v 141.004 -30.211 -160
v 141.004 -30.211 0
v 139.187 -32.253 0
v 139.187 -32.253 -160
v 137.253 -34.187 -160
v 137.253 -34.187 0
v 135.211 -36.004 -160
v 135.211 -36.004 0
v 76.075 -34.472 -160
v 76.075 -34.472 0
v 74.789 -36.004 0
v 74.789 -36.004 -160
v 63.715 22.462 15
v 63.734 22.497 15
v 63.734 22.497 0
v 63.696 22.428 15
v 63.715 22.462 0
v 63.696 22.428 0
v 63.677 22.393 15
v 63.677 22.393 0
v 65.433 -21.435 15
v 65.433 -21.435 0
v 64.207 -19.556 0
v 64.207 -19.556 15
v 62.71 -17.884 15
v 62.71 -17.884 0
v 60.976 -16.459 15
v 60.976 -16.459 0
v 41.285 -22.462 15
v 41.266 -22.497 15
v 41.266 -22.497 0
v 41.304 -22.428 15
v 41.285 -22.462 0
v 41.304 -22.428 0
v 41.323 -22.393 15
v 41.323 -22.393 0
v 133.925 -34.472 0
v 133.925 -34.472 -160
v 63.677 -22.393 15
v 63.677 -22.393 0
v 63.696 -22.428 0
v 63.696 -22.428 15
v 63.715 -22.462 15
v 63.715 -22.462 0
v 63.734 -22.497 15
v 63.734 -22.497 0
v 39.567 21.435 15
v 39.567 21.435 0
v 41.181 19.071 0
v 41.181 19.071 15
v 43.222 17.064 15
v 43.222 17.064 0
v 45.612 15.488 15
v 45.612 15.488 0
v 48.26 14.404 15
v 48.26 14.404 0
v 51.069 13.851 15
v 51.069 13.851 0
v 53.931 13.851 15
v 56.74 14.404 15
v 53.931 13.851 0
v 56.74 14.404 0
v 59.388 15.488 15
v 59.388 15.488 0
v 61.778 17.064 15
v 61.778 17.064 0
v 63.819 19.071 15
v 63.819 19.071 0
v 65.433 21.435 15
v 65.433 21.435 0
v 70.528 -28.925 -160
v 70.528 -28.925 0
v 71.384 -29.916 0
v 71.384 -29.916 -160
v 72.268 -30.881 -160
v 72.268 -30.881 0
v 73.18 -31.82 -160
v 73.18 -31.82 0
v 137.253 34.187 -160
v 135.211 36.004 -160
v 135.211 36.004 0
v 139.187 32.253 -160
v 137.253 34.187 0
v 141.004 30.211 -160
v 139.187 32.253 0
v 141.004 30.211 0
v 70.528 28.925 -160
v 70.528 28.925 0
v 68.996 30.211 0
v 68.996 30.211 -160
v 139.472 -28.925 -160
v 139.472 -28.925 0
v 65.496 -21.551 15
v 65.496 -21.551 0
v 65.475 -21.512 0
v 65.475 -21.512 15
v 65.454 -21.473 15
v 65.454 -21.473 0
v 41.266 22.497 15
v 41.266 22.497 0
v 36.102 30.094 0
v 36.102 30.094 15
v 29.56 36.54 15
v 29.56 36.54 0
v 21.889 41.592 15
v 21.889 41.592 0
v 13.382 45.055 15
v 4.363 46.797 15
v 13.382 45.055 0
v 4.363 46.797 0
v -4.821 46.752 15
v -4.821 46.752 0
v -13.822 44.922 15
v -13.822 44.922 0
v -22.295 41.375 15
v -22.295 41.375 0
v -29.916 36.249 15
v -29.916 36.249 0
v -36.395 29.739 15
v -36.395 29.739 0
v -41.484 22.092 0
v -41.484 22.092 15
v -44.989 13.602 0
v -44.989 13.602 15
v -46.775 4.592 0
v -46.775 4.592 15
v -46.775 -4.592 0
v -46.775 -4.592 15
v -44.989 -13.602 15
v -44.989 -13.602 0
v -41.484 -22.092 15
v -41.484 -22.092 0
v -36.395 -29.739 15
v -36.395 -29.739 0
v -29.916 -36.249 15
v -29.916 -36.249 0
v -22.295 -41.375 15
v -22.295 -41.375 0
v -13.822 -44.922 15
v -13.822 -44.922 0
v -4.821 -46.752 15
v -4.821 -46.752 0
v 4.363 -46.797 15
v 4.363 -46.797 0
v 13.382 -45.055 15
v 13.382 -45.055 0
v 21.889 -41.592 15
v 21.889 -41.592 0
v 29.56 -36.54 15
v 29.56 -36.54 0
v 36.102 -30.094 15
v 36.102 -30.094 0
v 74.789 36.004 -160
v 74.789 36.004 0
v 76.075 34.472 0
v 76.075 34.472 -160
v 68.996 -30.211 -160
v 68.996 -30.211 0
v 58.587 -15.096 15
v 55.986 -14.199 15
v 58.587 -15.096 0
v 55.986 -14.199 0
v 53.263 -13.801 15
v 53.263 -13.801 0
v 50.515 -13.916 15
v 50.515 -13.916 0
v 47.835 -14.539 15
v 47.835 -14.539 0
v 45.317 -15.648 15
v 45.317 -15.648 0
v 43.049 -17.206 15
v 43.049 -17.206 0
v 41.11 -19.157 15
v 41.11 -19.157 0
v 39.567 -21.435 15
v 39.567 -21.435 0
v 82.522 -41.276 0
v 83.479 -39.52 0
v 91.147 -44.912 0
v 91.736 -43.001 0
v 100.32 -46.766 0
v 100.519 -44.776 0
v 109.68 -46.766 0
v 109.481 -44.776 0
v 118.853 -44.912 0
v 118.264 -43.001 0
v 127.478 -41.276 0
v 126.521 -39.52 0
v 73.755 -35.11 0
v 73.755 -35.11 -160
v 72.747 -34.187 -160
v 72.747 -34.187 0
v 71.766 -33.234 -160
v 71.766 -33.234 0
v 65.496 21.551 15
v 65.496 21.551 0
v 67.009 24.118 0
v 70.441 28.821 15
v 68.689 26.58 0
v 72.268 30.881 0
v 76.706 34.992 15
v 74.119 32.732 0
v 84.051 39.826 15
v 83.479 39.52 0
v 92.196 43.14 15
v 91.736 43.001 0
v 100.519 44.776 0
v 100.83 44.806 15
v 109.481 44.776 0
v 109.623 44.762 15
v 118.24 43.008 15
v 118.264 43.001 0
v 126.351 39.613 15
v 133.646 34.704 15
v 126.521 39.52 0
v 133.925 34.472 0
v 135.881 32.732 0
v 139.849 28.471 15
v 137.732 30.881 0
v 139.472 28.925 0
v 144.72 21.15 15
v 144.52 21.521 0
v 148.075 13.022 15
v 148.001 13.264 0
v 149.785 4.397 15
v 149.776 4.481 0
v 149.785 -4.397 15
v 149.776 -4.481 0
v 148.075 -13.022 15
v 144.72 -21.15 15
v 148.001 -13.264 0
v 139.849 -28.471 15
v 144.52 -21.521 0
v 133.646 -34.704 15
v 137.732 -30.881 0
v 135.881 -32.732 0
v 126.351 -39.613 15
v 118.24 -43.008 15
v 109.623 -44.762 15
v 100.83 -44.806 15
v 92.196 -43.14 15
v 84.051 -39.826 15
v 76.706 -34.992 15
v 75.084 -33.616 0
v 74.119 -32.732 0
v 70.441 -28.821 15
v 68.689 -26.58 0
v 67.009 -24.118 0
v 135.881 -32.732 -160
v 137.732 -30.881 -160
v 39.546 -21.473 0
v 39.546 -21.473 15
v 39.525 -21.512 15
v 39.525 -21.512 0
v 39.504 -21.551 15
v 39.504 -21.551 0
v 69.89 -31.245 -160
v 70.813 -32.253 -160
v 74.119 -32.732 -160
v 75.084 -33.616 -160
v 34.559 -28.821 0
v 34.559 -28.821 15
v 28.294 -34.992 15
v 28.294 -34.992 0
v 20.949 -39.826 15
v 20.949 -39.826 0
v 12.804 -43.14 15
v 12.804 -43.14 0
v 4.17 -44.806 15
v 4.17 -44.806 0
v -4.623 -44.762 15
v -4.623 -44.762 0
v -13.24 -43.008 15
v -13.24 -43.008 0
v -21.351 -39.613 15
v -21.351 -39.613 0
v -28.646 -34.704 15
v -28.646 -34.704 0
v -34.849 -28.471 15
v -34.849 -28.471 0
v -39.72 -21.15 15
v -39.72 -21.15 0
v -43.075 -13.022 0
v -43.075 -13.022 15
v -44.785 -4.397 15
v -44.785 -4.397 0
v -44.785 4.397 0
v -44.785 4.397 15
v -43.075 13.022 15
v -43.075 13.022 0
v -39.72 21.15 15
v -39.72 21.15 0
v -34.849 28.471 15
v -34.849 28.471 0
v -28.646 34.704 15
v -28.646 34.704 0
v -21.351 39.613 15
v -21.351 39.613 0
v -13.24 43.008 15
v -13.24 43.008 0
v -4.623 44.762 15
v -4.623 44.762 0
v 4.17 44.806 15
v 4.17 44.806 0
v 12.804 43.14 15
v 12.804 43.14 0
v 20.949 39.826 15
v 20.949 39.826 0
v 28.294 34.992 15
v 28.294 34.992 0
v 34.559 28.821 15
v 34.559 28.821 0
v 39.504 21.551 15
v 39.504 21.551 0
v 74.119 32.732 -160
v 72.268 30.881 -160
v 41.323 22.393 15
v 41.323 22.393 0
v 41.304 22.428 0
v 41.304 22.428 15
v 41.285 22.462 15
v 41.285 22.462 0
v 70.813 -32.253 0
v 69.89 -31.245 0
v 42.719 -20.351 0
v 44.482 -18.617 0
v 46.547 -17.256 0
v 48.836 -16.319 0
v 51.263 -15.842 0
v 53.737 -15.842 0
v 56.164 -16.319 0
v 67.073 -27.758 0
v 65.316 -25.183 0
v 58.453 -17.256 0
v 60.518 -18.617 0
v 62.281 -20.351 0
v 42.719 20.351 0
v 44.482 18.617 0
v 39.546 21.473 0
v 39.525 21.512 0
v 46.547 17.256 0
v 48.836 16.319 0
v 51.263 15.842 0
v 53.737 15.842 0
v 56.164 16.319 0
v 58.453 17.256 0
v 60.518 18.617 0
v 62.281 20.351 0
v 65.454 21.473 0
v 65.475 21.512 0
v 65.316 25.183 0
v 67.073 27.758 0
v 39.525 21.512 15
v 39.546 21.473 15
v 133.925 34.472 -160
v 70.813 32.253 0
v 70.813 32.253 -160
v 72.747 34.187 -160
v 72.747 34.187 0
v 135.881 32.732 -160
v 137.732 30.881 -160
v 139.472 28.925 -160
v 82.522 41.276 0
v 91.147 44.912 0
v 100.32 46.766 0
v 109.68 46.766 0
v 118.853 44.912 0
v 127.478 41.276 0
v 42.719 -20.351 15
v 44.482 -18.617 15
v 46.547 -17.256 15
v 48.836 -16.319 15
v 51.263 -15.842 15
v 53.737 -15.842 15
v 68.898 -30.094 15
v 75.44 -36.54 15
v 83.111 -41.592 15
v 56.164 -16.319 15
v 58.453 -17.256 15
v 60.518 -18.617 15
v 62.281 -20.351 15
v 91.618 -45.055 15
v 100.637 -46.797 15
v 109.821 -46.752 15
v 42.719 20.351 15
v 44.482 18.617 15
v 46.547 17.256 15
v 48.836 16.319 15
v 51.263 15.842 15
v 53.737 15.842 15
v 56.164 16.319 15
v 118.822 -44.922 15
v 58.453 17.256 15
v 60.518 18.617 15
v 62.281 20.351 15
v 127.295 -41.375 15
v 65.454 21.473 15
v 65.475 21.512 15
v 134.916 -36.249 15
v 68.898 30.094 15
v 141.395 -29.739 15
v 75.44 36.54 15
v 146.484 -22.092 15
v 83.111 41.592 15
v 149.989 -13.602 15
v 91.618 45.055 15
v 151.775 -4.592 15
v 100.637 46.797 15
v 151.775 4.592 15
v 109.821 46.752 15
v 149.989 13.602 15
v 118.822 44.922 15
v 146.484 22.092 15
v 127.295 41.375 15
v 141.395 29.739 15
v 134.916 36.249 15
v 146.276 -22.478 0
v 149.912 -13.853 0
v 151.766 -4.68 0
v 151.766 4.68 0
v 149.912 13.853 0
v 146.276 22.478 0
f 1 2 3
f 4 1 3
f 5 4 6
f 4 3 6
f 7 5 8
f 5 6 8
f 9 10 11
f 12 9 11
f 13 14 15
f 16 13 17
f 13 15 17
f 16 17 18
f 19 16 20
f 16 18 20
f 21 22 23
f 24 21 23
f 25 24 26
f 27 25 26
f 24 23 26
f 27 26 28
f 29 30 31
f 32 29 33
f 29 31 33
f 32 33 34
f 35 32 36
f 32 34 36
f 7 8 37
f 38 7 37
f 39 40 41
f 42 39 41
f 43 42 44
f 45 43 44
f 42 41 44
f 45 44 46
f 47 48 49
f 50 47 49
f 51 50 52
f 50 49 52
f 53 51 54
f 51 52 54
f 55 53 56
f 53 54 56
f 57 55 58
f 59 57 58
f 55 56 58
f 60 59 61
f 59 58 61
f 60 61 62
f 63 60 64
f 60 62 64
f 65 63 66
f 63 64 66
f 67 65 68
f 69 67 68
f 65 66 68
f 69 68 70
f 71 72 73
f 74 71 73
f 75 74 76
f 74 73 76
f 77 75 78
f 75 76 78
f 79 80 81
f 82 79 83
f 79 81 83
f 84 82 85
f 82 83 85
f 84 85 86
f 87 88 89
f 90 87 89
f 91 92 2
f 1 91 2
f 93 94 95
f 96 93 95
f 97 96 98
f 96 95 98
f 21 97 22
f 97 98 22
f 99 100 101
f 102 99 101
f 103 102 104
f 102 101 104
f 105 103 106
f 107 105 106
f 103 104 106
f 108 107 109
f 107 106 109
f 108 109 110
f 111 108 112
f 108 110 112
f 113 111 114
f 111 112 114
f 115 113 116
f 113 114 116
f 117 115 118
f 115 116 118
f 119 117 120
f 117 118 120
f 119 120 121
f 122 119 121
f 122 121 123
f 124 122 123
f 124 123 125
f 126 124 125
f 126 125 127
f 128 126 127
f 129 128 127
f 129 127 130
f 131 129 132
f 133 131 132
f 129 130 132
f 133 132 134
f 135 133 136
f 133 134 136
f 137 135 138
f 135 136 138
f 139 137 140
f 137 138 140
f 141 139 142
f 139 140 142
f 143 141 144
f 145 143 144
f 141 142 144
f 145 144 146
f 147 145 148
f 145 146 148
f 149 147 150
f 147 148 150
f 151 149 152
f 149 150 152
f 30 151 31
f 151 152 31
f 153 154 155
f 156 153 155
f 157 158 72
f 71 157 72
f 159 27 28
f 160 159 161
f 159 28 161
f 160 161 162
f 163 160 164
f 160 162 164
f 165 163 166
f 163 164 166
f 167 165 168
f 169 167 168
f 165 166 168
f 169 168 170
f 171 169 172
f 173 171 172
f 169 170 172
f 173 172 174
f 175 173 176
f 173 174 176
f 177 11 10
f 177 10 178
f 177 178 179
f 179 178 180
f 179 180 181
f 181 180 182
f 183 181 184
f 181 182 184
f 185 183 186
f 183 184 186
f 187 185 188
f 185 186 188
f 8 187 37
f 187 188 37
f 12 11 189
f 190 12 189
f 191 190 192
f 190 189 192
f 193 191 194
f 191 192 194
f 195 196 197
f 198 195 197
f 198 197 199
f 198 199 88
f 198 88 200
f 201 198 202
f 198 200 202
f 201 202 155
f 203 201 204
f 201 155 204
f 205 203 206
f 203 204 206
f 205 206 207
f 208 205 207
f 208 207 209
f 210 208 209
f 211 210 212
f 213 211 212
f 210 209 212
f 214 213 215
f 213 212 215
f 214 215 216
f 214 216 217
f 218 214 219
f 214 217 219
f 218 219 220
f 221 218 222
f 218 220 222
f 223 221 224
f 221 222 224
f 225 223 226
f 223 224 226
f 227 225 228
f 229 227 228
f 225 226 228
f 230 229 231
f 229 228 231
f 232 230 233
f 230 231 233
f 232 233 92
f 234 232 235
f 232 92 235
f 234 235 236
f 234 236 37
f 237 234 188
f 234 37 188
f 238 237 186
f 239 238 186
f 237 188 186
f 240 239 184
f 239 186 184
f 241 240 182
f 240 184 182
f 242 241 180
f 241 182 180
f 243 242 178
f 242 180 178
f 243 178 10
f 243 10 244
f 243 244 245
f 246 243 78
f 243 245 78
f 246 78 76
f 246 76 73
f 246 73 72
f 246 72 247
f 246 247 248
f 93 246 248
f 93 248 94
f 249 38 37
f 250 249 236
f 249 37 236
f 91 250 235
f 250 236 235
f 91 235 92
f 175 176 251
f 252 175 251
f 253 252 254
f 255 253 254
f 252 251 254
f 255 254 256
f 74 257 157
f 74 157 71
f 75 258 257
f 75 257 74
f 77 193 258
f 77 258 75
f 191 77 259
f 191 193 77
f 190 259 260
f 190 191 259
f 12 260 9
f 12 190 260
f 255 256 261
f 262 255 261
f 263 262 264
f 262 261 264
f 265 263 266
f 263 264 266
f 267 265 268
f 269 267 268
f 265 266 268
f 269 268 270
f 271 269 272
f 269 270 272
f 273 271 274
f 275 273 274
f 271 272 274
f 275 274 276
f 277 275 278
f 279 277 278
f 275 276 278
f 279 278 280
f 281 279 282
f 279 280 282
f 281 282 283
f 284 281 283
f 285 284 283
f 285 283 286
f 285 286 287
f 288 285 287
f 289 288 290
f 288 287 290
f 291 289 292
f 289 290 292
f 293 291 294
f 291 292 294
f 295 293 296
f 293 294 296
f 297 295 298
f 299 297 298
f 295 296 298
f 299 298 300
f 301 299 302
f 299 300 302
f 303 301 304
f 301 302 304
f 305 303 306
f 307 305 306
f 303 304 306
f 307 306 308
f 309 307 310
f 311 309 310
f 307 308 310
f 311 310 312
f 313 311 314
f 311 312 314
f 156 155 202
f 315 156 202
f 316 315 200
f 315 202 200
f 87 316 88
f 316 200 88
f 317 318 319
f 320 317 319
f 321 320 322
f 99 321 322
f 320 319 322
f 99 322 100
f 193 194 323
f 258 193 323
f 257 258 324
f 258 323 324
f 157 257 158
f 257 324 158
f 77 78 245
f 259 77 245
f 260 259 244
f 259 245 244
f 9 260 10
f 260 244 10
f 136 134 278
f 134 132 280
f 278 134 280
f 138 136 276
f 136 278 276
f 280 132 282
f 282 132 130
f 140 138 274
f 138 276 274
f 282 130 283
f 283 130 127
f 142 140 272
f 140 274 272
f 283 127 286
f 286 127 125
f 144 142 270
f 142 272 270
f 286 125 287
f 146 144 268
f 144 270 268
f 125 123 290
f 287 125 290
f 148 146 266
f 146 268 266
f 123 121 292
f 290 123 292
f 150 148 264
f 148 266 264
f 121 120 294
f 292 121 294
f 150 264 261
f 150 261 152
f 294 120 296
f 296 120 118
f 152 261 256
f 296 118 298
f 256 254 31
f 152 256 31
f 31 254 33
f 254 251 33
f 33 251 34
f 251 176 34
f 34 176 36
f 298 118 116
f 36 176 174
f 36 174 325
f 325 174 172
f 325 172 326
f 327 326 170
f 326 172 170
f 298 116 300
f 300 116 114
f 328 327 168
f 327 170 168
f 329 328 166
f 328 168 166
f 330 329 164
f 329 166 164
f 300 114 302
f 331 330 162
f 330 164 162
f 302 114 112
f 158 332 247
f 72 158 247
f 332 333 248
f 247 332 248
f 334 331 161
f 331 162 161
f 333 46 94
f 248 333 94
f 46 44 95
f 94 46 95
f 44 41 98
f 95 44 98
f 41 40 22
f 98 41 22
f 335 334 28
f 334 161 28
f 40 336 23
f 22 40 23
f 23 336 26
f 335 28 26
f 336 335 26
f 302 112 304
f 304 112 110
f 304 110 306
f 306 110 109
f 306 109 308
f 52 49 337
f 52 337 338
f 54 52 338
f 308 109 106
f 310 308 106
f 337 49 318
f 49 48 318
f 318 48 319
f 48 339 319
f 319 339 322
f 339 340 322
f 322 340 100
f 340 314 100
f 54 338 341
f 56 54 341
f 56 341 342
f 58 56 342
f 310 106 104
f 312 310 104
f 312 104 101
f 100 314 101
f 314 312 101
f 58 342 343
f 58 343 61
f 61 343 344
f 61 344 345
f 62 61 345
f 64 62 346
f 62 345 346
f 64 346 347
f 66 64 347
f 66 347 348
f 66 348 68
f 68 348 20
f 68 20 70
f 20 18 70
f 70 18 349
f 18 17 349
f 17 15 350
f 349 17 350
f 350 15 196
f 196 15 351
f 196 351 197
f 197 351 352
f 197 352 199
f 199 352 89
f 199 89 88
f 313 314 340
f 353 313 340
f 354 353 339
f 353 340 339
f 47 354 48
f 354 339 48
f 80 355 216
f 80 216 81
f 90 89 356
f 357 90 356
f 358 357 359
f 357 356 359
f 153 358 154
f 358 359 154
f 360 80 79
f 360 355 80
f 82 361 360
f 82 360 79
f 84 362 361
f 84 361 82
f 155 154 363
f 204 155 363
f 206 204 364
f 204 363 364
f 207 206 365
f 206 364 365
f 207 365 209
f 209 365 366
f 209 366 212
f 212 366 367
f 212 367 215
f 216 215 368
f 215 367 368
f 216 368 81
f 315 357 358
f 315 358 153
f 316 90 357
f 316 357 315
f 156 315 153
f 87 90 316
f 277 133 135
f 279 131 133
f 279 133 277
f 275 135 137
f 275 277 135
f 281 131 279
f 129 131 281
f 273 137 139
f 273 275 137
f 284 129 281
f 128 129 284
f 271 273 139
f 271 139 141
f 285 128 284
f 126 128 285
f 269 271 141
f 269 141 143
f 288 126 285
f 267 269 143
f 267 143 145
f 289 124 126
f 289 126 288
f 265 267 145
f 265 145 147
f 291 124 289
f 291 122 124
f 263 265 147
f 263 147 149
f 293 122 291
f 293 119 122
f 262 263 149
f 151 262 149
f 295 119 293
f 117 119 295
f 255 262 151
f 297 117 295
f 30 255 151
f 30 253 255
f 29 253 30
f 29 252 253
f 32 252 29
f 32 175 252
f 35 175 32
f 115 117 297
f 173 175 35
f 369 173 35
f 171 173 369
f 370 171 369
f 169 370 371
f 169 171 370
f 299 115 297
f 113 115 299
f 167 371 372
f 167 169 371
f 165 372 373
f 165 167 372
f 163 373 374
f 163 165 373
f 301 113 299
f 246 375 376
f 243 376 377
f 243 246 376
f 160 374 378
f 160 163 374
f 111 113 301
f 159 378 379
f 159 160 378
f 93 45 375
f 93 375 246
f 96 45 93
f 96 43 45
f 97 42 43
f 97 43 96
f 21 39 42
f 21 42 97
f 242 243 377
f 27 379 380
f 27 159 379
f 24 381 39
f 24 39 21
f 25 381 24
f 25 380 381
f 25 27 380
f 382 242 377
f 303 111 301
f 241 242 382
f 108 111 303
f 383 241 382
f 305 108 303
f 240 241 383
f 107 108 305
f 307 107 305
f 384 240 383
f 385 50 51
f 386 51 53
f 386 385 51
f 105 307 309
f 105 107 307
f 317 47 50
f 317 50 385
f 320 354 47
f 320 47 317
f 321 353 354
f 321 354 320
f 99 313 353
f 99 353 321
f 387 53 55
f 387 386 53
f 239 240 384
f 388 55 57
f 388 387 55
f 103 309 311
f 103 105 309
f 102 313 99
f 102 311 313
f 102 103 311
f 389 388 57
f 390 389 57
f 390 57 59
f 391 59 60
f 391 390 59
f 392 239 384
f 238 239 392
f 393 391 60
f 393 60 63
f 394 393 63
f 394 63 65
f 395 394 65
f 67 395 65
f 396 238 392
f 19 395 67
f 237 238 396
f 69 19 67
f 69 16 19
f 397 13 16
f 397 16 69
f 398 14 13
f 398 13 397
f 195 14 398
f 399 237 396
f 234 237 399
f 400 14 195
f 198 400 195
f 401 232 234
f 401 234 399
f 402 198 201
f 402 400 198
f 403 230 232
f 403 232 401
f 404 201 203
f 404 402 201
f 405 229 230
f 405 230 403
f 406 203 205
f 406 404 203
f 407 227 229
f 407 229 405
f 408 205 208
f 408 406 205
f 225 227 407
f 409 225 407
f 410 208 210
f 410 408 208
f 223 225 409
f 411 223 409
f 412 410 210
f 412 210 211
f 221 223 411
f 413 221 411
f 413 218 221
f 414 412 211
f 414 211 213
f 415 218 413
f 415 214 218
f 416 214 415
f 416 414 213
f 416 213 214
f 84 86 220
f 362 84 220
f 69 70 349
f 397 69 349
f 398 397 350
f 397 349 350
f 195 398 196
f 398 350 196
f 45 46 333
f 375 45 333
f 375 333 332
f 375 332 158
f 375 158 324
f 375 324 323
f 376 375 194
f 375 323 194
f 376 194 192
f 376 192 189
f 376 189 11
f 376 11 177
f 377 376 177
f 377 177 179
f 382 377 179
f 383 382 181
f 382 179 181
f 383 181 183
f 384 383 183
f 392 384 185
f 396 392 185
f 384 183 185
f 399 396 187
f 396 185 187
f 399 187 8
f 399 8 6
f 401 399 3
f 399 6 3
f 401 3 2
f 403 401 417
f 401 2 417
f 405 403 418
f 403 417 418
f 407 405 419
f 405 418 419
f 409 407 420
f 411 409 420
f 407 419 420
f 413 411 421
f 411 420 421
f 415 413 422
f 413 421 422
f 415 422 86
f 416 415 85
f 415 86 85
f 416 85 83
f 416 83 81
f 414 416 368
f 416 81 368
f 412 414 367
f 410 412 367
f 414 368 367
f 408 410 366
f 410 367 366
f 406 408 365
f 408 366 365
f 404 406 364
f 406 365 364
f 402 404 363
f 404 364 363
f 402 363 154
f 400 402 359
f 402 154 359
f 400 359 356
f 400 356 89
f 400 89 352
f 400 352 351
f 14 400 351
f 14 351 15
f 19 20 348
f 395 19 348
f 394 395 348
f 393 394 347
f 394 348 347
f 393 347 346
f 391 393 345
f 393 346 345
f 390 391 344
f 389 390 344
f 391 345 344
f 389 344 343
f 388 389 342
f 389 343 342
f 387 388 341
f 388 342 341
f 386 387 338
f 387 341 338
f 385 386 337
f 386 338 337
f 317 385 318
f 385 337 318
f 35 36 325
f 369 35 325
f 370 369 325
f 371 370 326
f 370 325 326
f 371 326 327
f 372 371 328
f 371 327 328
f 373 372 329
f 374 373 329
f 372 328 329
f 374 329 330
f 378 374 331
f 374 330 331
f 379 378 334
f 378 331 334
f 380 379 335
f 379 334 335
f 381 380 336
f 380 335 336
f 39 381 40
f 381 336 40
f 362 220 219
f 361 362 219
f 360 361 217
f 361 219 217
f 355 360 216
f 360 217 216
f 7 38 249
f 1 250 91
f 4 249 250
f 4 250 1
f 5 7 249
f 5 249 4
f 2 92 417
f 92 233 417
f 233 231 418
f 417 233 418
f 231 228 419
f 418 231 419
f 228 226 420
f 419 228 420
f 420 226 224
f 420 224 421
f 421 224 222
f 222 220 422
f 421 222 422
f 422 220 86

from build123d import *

# Parameters (mm, degrees)
F1_DEPTH = 15
F3_DEPTH = 160


# Not quite as in the source:
# - after a boolean that leaves OpenCascade's solid faulty, fix() repairs it


with BuildPart() as f1:
    # F0 (on Top) → F1 (new body)
    with BuildSketch(Plane.XY):
        with BuildLine():
            ThreePointArc((41.3226906327, -22.3927496943), (52.5, -15.7816452182), (63.6773093673, -22.3927496943))
            ThreePointArc((63.6773093673, -22.3927496943), (63.7058777697, -22.4450182881), (63.7342017495, -22.4974197353))
            ThreePointArc((63.7342017494, -22.4974197352), (152, 0), (63.7342017494, 22.4974197352))
            ThreePointArc((63.7342017494, 22.4974197352), (63.7058777696, 22.445018288), (63.6773093673, 22.3927496943))
            ThreePointArc((63.6773093673, 22.3927496943), (52.5, 15.7816452182), (41.3226906327, 22.3927496943))
            ThreePointArc((41.3226906327, 22.3927496943), (41.2941222304, 22.445018288), (41.2657982506, 22.4974197352))
            ThreePointArc((41.2657982506, 22.4974197352), (-47, 0), (41.2657982506, -22.4974197352))
            ThreePointArc((41.2657982506, -22.4974197352), (41.2941222304, -22.445018288), (41.3226906327, -22.3927496943))
        make_face()
        with BuildLine():
            ThreePointArc((39.5041211148, 21.5505084615), (39.5355894457, 21.4927235868), (39.5669732516, 21.4348927618))
            ThreePointArc((39.5669732516, 21.4348927618), (52.5, 13.7816452182), (65.4330267484, 21.4348927618))
            ThreePointArc((65.4330267484, 21.4348927618), (65.4644105543, 21.4927235868), (65.4958788852, 21.5505084615))
            ThreePointArc((65.4958788852, 21.5505084615), (150, 0), (65.4958788852, -21.5505084615))
            ThreePointArc((65.4958788852, -21.5505084615), (65.4644105543, -21.4927235868), (65.4330267484, -21.4348927618))
            ThreePointArc((65.4330267484, -21.4348927618), (63.4899302841, -18.6916573179), (60.976304449, -16.4594723499))
            ThreePointArc((60.976304449, -16.4594723499), (49.1601952928, -14.1646192224), (39.5669732516, -21.4348927618))
            ThreePointArc((39.5669732516, -21.4348927618), (39.5355894457, -21.4927235868), (39.5041211148, -21.5505084615))
            ThreePointArc((39.5041211148, -21.5505084615), (-45, 0), (39.5041211148, 21.5505084615))
        make_face(mode=Mode.SUBTRACT)
    extrude(amount=F1_DEPTH)

    # F2 (on face) → F3 (join)
    with BuildSketch(Plane(origin=(0, 0, 0), x_dir=(1, 0, 0), z_dir=(0, 0, -1))):
        with BuildLine():
            ThreePointArc((74.7889823447, 36.0040888266), (73.2472602421, 34.6520348301), (71.7659812842, 33.2340187158))
            Line((71.7659812842, 33.2340187158), (73.1801948457, 31.8198051543))
            ThreePointArc((73.1801948466, 31.8198051534), (74.5984406573, 33.1774801565), (76.0745575641, 34.4719999404))
            Line((76.0745575641, 34.4719999404), (74.7889823447, 36.0040888266))
        make_face()
        with BuildLine():
            ThreePointArc((71.7659812842, 33.2340187158), (70.3479651699, 31.7527397579), (68.9959111734, 30.2110176553))
            Line((68.9959111734, 30.2110176553), (70.5280000596, 28.9254424359))
            ThreePointArc((70.5280000596, 28.9254424359), (71.8225198435, 30.4015593427), (73.1801948466, 31.8198051534))
            Line((73.1801948457, 31.8198051543), (71.7659812842, 33.2340187158))
        make_face()
        with BuildLine():
            ThreePointArc((141.0040888266, 30.2110176553), (138.2340187158, 33.2340187158), (135.2110176553, 36.0040888266))
            Line((135.2110176553, 36.0040888266), (133.9254424359, 34.4719999404))
            ThreePointArc((133.9254424359, 34.4719999404), (136.8198051534, 31.8198051534), (139.4719999404, 28.9254424359))
            Line((139.4719999404, 28.9254424359), (141.0040888266, 30.2110176553))
        make_face()
        with BuildLine():
            ThreePointArc((135.2110176553, -36.0040888266), (138.2340187158, -33.2340187158), (141.0040888266, -30.2110176553))
            Line((141.0040888266, -30.2110176553), (139.4719999404, -28.9254424359))
            ThreePointArc((139.4719999404, -28.9254424359), (136.8198051534, -31.8198051534), (133.9254424359, -34.4719999404))
            Line((133.9254424359, -34.4719999404), (135.2110176553, -36.0040888266))
        make_face()
        with BuildLine():
            Line((70.5280000596, -28.9254424359), (68.9959111734, -30.2110176553))
            ThreePointArc((68.9959111734, -30.2110176553), (71.7659812842, -33.2340187158), (74.7889823447, -36.0040888266))
            Line((74.7889823447, -36.0040888266), (76.0745575641, -34.4719999404))
            ThreePointArc((76.0745575641, -34.4719999404), (73.1801948466, -31.8198051534), (70.5280000596, -28.9254424359))
        make_face()
    extrude(amount=F3_DEPTH)

    add(f1.part.fix(), mode=Mode.REPLACE)


solid = f1.part
